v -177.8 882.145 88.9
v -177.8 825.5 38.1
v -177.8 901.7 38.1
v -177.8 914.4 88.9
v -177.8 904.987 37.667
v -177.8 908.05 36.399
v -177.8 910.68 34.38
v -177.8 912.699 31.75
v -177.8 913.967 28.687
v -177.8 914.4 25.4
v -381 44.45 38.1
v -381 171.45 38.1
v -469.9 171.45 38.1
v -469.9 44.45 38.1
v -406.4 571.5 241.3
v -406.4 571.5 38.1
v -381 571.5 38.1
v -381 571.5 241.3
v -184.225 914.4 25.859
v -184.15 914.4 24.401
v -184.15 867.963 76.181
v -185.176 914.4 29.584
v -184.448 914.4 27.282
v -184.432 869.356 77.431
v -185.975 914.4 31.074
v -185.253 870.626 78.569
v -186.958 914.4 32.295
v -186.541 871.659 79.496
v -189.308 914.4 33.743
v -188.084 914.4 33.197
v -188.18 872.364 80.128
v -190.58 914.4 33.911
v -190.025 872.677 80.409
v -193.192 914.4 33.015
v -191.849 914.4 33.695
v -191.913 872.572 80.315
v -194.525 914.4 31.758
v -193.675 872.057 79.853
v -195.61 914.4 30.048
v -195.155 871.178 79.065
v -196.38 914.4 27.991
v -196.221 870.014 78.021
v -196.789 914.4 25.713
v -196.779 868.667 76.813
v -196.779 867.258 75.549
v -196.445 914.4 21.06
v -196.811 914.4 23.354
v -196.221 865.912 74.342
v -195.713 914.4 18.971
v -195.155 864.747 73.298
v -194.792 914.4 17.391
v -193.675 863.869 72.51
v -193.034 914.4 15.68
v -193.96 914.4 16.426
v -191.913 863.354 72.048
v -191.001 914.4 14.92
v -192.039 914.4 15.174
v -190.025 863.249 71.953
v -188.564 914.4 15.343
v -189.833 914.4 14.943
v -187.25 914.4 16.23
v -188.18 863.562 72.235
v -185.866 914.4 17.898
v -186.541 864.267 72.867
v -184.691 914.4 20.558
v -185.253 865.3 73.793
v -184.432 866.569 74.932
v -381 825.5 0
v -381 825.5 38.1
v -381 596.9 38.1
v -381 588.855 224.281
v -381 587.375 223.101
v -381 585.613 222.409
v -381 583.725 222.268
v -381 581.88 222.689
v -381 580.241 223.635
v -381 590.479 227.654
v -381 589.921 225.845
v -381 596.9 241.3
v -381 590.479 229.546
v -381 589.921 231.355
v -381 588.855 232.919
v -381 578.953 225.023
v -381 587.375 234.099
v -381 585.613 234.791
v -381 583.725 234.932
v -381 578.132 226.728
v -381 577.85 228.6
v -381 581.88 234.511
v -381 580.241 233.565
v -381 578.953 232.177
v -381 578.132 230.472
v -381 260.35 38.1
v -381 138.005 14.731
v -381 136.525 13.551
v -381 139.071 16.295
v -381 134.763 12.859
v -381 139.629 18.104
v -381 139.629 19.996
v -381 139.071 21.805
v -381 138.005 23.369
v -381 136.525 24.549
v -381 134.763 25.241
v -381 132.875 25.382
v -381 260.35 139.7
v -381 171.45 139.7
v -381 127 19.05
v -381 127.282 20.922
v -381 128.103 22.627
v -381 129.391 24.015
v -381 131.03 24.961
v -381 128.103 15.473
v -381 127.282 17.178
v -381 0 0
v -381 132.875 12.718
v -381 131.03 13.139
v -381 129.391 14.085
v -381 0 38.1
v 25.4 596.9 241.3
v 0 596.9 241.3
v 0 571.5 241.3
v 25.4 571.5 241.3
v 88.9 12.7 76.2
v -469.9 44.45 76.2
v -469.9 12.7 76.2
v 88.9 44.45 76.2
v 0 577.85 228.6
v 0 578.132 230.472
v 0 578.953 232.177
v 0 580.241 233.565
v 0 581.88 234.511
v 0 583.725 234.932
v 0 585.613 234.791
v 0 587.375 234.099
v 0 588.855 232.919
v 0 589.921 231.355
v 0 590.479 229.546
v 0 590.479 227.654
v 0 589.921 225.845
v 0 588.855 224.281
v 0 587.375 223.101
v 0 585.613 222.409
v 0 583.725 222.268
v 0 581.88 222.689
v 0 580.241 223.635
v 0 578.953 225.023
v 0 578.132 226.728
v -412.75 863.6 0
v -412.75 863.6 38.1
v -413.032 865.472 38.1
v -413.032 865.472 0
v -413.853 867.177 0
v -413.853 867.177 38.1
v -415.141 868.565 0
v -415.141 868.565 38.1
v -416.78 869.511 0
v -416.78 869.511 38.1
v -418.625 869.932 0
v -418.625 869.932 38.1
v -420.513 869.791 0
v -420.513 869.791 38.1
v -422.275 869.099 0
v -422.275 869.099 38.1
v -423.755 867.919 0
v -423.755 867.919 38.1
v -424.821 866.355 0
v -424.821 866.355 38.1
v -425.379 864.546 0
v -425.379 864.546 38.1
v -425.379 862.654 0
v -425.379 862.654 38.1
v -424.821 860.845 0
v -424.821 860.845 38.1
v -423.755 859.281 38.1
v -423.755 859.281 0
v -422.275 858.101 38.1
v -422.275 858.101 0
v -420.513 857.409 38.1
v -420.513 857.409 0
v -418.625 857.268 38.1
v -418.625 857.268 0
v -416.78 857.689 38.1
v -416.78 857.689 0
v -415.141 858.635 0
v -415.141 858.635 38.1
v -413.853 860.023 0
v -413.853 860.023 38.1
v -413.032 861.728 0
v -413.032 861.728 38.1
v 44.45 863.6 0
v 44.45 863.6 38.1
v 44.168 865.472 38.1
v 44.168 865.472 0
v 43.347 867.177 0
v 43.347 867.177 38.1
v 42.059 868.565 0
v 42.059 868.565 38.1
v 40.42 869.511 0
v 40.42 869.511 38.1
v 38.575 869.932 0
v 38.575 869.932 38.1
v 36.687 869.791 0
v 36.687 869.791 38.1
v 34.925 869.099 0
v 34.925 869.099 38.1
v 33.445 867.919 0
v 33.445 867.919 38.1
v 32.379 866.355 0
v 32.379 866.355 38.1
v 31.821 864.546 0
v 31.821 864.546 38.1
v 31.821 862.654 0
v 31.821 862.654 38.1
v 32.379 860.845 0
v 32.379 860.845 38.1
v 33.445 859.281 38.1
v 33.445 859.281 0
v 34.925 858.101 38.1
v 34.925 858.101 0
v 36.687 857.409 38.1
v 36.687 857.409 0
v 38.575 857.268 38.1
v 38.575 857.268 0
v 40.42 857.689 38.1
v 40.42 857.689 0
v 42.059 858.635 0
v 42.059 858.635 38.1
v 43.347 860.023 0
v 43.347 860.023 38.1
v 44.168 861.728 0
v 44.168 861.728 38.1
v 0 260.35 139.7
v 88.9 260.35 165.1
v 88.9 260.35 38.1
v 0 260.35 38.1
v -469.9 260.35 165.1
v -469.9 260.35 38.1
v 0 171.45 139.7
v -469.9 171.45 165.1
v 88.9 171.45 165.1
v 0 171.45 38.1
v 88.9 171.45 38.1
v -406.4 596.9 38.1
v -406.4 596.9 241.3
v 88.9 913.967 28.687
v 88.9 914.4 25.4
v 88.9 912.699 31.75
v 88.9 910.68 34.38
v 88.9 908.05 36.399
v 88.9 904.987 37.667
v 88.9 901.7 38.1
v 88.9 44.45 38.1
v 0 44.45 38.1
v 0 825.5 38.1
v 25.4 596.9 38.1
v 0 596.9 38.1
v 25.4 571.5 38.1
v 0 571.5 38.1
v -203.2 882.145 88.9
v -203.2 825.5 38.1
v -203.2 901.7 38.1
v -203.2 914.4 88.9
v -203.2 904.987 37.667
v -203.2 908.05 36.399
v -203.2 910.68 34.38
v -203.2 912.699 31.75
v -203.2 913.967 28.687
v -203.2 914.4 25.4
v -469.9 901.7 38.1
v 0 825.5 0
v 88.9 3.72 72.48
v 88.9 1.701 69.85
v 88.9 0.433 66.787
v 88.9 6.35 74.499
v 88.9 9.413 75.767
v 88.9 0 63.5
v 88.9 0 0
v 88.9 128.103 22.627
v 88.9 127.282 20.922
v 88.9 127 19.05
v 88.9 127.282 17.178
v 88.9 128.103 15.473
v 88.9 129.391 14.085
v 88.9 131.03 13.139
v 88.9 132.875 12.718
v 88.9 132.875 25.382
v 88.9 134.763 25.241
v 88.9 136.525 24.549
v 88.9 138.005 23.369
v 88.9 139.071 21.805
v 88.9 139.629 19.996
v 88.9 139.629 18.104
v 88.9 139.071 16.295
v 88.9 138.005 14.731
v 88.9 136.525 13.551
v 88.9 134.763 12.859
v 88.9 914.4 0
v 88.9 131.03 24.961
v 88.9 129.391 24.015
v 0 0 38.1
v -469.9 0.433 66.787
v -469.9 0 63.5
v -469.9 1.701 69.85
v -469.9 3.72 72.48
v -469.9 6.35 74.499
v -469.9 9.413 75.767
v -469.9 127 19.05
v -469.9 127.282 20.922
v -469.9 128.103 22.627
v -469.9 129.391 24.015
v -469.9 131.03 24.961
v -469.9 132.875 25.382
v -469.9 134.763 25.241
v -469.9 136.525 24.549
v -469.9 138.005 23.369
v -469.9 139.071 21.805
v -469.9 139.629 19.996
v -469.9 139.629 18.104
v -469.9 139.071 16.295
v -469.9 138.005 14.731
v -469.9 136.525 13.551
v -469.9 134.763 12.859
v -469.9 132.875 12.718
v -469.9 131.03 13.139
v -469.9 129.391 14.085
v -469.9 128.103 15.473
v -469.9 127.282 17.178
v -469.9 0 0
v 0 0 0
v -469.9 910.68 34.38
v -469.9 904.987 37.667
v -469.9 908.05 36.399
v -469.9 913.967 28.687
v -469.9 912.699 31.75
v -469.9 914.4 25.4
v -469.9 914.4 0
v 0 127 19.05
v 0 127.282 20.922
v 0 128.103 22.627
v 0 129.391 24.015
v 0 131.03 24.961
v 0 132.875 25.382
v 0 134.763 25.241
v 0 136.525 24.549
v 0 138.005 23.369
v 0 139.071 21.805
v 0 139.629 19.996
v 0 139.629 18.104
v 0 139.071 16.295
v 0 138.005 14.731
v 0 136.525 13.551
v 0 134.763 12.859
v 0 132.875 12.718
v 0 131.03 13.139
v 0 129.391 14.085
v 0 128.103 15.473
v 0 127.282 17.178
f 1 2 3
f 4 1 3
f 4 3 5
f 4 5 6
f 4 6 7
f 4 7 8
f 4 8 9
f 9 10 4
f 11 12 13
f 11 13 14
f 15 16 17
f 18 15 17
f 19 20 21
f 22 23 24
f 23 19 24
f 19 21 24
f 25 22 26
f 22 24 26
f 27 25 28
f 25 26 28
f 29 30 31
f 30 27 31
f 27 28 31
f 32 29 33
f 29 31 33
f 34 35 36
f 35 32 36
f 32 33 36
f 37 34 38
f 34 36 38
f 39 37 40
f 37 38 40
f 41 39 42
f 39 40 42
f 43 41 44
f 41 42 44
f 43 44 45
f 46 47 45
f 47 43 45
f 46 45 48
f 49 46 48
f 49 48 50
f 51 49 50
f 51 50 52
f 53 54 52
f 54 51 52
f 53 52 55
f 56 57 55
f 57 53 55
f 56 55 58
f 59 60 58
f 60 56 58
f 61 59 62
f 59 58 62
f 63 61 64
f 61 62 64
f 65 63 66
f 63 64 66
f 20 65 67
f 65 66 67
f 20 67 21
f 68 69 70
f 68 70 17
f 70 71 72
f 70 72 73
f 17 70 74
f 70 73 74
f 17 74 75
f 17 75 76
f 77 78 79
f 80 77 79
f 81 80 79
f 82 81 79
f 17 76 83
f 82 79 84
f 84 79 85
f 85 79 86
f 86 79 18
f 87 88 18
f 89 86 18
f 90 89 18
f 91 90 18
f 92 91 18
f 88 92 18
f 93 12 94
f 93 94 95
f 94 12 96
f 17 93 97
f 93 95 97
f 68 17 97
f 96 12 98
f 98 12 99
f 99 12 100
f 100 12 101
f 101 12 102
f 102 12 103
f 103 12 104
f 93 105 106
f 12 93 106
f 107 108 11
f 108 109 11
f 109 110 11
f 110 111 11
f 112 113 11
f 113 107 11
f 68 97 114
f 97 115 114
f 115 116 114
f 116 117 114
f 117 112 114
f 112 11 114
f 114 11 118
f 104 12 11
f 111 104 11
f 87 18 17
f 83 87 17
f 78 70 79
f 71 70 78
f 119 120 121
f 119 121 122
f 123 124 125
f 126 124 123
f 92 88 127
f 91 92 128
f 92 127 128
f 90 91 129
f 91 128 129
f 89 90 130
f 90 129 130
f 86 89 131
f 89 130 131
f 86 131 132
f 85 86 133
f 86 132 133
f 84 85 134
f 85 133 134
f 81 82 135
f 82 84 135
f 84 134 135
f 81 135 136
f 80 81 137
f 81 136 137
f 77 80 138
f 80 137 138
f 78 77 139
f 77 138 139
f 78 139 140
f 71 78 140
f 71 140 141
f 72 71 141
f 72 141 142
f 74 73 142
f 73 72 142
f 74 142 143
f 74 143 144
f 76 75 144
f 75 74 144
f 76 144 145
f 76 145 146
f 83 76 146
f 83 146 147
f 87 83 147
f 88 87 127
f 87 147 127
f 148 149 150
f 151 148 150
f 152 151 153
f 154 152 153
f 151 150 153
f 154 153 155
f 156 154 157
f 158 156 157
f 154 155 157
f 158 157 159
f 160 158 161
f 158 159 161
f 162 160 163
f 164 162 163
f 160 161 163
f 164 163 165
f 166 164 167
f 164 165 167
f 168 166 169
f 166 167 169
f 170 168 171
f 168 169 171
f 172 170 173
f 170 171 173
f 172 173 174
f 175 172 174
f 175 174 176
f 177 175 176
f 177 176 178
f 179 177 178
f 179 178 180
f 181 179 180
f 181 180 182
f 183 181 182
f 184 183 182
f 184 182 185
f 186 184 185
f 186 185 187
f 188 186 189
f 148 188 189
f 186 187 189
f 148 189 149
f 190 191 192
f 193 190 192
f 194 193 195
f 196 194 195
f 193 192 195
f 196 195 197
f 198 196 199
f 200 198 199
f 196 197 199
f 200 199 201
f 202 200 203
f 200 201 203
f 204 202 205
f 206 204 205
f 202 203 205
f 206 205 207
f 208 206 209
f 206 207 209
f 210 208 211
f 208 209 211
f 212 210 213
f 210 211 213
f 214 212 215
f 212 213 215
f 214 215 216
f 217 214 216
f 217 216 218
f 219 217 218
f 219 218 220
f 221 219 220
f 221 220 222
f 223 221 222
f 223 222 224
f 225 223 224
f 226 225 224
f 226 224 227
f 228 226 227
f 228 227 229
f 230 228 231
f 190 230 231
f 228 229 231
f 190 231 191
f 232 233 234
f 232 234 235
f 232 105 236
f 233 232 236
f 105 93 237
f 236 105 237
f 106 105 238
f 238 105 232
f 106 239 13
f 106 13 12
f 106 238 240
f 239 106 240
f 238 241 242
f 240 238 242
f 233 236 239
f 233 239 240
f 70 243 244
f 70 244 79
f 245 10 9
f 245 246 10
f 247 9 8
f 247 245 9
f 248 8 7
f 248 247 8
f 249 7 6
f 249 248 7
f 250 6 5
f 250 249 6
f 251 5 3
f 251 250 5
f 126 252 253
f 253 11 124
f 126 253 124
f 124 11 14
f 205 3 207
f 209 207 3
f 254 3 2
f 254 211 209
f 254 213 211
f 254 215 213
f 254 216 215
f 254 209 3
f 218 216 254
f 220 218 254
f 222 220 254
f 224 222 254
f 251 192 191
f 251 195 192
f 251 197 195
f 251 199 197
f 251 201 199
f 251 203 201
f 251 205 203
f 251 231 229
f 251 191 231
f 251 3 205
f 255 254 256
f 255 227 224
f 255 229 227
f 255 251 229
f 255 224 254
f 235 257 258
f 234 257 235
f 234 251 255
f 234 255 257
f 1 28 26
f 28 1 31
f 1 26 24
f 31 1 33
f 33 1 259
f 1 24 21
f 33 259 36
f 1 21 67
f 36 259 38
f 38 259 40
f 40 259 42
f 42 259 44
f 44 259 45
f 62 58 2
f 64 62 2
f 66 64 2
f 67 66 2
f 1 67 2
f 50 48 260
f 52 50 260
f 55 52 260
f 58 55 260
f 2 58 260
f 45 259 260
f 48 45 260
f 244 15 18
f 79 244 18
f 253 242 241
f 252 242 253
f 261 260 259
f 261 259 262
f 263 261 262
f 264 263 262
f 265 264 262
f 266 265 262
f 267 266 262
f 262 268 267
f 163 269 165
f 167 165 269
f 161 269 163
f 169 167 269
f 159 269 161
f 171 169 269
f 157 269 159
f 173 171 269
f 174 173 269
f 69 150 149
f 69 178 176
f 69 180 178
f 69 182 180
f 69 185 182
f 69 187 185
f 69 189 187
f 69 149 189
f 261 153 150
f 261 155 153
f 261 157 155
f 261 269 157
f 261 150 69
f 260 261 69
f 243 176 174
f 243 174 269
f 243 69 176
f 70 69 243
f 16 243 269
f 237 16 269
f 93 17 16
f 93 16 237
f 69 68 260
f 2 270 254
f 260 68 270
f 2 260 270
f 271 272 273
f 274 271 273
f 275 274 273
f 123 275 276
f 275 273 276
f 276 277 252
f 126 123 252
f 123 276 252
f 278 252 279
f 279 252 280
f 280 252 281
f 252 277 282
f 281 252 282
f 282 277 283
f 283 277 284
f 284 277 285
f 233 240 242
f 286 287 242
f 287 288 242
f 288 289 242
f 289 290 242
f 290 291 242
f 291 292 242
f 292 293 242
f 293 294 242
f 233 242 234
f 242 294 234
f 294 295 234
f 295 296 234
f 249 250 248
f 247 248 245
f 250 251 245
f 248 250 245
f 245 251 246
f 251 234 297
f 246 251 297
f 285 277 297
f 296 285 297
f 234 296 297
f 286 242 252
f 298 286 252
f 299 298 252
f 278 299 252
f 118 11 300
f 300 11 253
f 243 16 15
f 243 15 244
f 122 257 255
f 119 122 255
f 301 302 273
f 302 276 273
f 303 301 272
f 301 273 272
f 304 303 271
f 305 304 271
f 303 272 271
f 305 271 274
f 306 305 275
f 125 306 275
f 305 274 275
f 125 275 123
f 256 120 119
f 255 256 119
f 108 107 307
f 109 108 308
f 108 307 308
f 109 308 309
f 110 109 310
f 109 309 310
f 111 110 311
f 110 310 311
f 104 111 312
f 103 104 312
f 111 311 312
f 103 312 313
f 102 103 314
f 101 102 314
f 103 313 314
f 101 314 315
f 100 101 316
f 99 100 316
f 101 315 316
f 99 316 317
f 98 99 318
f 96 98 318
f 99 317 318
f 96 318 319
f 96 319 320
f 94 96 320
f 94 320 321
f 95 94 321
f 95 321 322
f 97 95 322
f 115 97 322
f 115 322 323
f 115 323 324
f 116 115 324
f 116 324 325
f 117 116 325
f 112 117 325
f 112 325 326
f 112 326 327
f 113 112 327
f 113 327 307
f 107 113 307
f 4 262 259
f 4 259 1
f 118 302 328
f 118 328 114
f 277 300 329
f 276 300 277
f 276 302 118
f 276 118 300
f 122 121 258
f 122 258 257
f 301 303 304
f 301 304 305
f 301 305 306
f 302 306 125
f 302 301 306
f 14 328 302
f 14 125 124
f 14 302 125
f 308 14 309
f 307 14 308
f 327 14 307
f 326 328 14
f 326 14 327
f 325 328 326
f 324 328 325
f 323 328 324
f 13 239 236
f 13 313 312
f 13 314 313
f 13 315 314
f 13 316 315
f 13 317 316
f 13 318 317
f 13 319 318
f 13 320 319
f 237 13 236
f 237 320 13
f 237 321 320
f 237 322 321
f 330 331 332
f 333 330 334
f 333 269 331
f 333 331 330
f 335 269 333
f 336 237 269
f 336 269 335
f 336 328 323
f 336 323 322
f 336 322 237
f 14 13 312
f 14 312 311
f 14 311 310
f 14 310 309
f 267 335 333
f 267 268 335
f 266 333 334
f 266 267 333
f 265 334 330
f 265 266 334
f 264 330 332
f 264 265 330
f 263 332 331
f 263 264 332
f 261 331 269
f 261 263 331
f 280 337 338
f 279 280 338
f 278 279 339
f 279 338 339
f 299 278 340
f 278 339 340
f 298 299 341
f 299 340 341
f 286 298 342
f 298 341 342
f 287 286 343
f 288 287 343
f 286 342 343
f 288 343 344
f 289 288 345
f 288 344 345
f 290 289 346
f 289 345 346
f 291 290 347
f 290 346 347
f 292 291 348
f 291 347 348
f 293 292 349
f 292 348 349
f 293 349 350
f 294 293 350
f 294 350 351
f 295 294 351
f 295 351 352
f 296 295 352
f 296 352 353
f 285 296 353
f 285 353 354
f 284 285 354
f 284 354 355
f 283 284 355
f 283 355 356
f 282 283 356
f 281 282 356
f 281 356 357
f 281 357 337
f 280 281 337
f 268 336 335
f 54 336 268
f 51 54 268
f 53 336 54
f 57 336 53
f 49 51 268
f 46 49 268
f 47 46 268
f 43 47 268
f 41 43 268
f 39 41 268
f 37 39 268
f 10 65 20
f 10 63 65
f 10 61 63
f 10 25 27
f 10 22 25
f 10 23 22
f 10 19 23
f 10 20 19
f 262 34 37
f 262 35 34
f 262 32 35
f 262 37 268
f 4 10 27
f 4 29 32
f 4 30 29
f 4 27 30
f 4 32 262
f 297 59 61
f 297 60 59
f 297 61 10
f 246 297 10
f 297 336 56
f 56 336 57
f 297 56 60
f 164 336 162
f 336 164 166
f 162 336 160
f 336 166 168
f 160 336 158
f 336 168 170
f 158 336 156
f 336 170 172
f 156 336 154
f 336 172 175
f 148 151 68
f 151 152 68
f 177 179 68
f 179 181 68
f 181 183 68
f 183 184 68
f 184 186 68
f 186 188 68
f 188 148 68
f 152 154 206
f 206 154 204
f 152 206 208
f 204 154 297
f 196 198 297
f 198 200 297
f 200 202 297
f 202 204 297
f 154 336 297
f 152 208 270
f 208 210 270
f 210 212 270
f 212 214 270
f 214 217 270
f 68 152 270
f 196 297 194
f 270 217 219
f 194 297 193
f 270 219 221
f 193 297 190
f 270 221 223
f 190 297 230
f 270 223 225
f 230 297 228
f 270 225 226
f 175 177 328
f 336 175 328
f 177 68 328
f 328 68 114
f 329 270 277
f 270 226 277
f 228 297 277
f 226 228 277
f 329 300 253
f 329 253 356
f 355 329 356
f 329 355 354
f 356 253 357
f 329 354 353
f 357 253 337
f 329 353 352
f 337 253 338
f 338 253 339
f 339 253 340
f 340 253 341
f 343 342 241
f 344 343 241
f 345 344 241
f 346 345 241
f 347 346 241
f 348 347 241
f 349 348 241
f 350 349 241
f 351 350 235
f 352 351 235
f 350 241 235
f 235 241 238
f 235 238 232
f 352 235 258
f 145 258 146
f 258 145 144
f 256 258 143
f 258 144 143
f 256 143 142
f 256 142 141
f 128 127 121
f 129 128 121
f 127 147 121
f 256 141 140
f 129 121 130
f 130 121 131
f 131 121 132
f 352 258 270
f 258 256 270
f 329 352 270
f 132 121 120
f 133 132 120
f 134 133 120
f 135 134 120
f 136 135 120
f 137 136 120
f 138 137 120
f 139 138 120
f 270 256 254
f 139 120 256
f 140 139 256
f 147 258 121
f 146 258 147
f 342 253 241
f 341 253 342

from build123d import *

# Parameters (mm, degrees)
F0_W      = 914.4
F0_H      = 38.1
F1_DEPTH  = 88.9
F2_W      = 88.9
F2_H      = 44.45
F2_W_2    = 469.9
F3_DEPTH  = 38.1
F4_W      = 88.9
F4_H      = 44.45
F4_H_2    = 869.95
F5_DEPTH  = 38.1
F6_R      = 6.35
F7_DEPTH  = 558.801
F9_W      = 25.4
F9_H      = 25.4
F10_DEPTH = 203.2
F11_W     = 25.4
F11_H     = 25.4
F12_DEPTH = 203.2
F13_R     = 6.35
F14_DEPTH = 406.4
F15_W     = 88.9
F15_H     = 38.1
F16_DEPTH = 381
F17_R     = 6.35
F18_DEPTH = 38.1
F19_W     = 25.4
F19_H     = 88.9
F20_DEPTH = 50.8
F21_R     = 12.7
F23_DEPTH = 25.4
F24_R     = 6.35
F25_DEPTH = 101.6
F26_W     = 88.9
F26_H     = 88.9
F27_DEPTH = 101.6
F28_W     = 469.9
F28_H     = 88.9
F28_W_2   = 558.8
F29_DEPTH = 25.4


with BuildPart() as f1:
    # F0 (on Right) → F1 (new body)
    with BuildSketch(Plane.YZ):
        with Locations((457.2, 19.05)):
            Rectangle(F0_W, F0_H)
    extrude(amount=F1_DEPTH)

    # F2 (on face) → F3 (join)
    with BuildSketch(Plane.XY.offset(38.1)):
        with Locations((44.45, 22.225)):
            Rectangle(F2_W, F2_H)
        with Locations((-234.95, 22.225)):
            Rectangle(F2_W_2, F2_H)
    extrude(amount=F3_DEPTH)

    # F4 (on face) → F5 (join)
    with BuildSketch(Plane(origin=(0, 0, 38.1), x_dir=(1, 0, 0), z_dir=(0, 0, -1))):
        with Locations((-425.45, -22.225)):
            Rectangle(F4_W, F4_H)
        with Locations((-425.45, -479.425)):
            Rectangle(F4_W, F4_H_2)
    extrude(amount=F5_DEPTH)

    # F6 (on face) → F7 (cut, through all)
    with BuildSketch(Plane(origin=(-469.9, 0, 0), x_dir=(0, -1, 0), z_dir=(-1, 0, 0))):
        with Locations((-133.35, 19.05)):
            Circle(F6_R)
    extrude(amount=-F7_DEPTH, mode=Mode.SUBTRACT)

    # F9 (on face) → F10 (join)
    with BuildSketch(Plane.XY.offset(38.1)):
        with Locations((12.7, 584.2)):
            Rectangle(F9_W, F9_H)
    extrude(amount=F10_DEPTH)

    # F11 (on face) → F12 (join)
    with BuildSketch(Plane.XY.offset(38.1)):
        with Locations((-393.7, 584.2)):
            Rectangle(F11_W, F11_H)
    extrude(amount=F12_DEPTH)

    # F13 (on face) → F14 (join)
    with BuildSketch(Plane(origin=(0, 0, 0), x_dir=(0, -1, 0), z_dir=(-1, 0, 0))):
        with Locations((-584.2, 228.6)):
            Circle(F13_R)
    extrude(amount=F14_DEPTH)

    # F15 (on face) → F16 (join)
    with BuildSketch(Plane(origin=(0, 0, 0), x_dir=(0, -1, 0), z_dir=(-1, 0, 0))):
        with Locations((-869.95, 19.05)):
            Rectangle(F15_W, F15_H)
    extrude(amount=F16_DEPTH)

    # F17 (on face) → F18 (cut)
    with BuildSketch(Plane.XY.offset(38.1)):
        with Locations((38.1, 863.6)):
            Circle(F17_R)
        with Locations((-419.1, 863.6)):
            Circle(F17_R)
    extrude(amount=-F18_DEPTH, mode=Mode.SUBTRACT)

    # F19 (on face) → F20 (join)
    with BuildSketch(Plane.XY.offset(38.1)):
        with Locations((-190.5, 869.95)):
            Rectangle(F19_W, F19_H)
    extrude(amount=F20_DEPTH)

    # F21
    f21_edges = [f1.edges().sort_by_distance(p)[0] for p in [
        (-336.55, 914.4, 38.1),
        (-44.45, 914.4, 38.1),
        (-190.5, 0, 76.2),
    ]]
    fillet(f21_edges, radius=F21_R)

    # F22 (on face) → F23 (cut)
    with BuildSketch(Plane(origin=(-203.2, 0, 0), x_dir=(0, -1, 0), z_dir=(-1, 0, 0))):
        Polygon((-825.5, 88.9), (-882.1451067924, 88.9), (-825.5, 38.1), align=None)
    extrude(amount=-F23_DEPTH, mode=Mode.SUBTRACT)

    # F24 (on face) → F25 (cut)
    with BuildSketch(Plane(origin=(0, 349.0370188612, -389.197622203), x_dir=(1, 0, 0), z_dir=(0, -0.667652347, 0.7444731987))):
        with Locations((-190.5, 697.0376830206)):
            Circle(F24_R)
    extrude(amount=-F25_DEPTH, mode=Mode.SUBTRACT)

    # F26 (on face) → F27 (join)
    with BuildSketch(Plane.XY.offset(38.1)):
        with Locations((-425.45, 215.9)):
            Rectangle(F26_W, F26_H)
        with Locations((44.45, 215.9)):
            Rectangle(F26_W, F26_H)
    extrude(amount=F27_DEPTH)

    # F28 (on face) → F29 (join)
    with BuildSketch(Plane.XY.offset(139.7)):
        with Locations((-146.05, 215.9)):
            Rectangle(F28_W, F28_H)
        with Locations((-190.5, 215.9)):
            Rectangle(F28_W_2, F28_H)
    extrude(amount=F29_DEPTH)


solid = f1.part
